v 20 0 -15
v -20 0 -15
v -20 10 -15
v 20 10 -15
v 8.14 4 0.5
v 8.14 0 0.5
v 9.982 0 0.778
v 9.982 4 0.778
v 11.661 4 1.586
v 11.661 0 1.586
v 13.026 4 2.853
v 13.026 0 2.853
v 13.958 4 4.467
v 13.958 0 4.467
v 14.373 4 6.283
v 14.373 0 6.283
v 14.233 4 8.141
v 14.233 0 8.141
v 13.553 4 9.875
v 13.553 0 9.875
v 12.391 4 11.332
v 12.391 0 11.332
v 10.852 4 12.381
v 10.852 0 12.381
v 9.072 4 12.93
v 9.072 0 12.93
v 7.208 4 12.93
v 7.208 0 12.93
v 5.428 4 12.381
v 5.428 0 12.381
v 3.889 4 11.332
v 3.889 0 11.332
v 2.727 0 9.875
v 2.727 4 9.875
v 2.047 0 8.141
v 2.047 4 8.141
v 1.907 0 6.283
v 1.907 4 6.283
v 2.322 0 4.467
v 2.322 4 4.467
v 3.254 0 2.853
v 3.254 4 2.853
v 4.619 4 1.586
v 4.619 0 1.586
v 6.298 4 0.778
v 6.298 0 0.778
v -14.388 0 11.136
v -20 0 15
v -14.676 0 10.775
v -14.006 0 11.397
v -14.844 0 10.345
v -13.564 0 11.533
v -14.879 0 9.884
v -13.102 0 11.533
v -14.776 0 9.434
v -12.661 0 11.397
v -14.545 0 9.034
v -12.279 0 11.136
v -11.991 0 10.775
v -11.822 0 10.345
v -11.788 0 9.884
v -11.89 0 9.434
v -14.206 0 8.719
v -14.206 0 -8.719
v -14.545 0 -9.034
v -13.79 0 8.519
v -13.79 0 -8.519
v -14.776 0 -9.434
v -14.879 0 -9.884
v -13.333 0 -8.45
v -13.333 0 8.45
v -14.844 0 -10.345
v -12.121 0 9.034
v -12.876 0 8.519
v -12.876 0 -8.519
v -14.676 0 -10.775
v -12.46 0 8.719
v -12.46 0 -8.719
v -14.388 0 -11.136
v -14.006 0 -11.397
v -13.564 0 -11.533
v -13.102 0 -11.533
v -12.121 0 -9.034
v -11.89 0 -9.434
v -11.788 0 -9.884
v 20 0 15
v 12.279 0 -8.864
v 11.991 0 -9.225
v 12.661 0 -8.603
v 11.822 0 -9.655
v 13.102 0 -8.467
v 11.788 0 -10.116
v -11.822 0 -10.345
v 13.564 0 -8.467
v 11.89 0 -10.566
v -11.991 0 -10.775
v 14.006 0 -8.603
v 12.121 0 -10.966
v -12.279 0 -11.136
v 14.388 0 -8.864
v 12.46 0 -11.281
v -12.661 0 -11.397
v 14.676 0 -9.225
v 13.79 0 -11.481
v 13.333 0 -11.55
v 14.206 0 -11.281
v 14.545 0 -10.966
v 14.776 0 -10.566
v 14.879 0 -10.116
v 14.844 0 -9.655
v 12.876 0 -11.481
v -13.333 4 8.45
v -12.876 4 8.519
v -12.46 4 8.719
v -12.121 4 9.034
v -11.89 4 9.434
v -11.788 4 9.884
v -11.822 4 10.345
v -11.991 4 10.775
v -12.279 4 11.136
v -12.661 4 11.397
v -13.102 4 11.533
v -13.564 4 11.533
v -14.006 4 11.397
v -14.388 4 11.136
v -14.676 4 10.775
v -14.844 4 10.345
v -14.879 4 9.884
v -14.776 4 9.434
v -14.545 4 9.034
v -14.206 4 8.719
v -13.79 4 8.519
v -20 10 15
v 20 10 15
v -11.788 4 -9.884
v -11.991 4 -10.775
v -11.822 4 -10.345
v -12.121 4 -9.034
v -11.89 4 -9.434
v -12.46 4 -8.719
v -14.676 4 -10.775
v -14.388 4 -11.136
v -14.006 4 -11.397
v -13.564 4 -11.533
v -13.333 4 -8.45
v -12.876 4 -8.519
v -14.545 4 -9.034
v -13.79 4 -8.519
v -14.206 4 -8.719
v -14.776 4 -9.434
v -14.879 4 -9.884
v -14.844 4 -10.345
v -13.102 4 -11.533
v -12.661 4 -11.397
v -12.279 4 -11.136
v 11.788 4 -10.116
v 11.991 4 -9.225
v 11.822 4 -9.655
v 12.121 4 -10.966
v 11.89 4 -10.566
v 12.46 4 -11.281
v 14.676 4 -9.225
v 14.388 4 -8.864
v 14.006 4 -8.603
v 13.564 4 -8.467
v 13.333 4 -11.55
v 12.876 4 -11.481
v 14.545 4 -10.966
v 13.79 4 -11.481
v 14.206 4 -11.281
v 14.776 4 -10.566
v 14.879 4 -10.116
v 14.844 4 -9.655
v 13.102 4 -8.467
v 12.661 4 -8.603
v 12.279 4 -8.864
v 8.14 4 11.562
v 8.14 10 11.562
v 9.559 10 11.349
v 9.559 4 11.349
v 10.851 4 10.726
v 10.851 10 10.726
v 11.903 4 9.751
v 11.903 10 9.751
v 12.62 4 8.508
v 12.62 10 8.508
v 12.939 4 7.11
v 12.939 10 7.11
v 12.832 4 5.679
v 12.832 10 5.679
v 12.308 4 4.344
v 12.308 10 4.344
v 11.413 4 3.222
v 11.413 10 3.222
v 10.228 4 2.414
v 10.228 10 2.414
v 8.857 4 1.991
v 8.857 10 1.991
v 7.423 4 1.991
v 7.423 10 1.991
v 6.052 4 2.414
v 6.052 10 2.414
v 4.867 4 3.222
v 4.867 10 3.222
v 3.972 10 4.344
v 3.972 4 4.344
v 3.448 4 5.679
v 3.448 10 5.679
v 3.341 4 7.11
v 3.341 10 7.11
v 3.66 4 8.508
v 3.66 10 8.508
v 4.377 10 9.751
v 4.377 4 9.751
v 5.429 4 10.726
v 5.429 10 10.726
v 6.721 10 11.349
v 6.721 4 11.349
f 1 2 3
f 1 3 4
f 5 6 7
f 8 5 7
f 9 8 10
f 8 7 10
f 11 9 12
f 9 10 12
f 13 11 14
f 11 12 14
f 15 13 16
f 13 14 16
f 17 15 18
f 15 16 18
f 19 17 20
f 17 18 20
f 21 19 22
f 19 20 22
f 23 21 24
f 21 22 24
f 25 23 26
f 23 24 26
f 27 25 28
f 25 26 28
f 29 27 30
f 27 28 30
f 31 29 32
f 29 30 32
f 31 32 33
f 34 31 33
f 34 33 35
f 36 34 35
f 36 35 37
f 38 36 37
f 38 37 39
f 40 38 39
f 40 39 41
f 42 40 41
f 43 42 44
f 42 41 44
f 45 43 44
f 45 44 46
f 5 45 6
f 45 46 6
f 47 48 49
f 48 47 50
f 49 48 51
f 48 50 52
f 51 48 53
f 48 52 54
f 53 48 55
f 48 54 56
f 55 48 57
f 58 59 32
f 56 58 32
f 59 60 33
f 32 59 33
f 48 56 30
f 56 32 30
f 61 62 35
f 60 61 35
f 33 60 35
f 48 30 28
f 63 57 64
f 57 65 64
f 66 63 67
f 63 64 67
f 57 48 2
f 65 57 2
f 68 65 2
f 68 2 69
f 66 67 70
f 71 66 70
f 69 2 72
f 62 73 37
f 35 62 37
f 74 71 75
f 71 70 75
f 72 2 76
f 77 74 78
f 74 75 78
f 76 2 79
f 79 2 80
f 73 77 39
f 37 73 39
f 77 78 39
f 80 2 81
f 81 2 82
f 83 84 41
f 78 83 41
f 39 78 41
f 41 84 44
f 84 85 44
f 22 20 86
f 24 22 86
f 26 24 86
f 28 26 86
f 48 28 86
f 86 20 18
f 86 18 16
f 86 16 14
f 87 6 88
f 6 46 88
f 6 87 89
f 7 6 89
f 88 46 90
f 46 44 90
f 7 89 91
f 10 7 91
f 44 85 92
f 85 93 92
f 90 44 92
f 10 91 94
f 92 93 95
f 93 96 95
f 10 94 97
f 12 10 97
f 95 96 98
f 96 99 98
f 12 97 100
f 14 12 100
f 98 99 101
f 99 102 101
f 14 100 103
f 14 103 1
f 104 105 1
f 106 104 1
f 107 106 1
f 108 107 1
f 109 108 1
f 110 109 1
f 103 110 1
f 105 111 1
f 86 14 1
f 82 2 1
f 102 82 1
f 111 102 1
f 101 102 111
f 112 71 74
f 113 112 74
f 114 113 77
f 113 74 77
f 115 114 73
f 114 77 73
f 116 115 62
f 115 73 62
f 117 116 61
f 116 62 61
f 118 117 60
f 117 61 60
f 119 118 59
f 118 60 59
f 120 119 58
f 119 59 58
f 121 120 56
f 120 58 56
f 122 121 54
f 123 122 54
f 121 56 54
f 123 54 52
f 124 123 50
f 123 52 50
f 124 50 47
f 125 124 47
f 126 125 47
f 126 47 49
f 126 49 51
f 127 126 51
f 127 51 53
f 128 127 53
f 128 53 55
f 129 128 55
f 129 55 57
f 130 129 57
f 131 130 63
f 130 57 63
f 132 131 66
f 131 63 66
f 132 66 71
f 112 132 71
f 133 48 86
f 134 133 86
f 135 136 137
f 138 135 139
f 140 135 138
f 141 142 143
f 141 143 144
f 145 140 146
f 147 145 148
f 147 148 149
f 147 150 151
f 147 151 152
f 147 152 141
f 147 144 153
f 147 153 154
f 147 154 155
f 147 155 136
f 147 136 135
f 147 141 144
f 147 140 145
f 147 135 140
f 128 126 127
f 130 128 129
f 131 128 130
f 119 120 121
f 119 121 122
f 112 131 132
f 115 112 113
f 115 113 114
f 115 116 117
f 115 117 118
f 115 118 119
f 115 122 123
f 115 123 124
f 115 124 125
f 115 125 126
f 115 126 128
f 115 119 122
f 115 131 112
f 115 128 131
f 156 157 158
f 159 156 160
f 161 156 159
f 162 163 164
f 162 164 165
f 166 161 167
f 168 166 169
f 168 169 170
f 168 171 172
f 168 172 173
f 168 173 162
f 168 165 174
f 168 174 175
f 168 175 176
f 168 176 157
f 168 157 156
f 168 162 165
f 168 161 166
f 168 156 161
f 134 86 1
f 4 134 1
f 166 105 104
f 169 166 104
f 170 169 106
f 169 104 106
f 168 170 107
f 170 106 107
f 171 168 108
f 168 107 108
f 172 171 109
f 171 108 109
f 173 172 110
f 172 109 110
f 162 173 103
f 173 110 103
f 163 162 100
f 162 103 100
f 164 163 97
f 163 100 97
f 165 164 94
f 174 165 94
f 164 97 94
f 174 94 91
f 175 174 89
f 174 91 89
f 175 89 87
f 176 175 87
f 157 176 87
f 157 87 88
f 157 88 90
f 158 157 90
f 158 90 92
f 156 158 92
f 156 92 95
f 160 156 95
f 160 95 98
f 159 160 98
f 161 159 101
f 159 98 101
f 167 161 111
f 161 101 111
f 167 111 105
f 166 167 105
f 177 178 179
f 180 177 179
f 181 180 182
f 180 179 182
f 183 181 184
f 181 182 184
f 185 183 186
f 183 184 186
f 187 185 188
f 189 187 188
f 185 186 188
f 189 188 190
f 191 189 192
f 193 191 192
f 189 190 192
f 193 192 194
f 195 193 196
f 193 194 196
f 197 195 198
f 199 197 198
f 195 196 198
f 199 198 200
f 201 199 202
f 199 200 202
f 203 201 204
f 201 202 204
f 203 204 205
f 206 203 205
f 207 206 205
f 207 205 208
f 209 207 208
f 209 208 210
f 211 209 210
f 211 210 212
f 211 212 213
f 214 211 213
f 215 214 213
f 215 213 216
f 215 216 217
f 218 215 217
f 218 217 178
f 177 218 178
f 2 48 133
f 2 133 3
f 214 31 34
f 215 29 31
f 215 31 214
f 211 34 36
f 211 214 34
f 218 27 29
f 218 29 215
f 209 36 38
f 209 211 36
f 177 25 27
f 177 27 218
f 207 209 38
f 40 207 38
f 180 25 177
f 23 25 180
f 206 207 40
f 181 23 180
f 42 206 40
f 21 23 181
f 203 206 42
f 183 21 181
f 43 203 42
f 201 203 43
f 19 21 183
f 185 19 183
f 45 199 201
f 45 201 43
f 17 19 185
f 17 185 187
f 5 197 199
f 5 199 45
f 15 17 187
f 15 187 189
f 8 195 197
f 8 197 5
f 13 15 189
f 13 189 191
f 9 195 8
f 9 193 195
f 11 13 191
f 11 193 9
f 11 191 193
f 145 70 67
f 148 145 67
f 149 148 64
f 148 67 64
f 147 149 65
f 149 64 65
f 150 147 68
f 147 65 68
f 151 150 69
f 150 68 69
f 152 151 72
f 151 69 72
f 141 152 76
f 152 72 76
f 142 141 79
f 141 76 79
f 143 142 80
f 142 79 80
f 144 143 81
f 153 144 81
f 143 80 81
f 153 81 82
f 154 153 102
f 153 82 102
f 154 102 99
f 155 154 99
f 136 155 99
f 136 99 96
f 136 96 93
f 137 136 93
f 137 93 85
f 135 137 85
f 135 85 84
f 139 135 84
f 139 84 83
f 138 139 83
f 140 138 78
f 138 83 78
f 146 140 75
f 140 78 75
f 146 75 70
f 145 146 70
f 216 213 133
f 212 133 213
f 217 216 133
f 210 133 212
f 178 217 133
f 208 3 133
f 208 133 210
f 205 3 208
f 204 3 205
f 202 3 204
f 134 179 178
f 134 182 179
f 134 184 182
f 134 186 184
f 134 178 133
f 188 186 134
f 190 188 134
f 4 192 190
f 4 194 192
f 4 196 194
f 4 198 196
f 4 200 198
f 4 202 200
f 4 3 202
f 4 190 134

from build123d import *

# Parameters (mm, degrees)
SKETCH1_W           = 40
SKETCH1_H           = 30
BOSS_EXTRUDE1_DEPTH = 10
SKETCH2_R           = 1.55
SKETCH2_R_2         = 6.25
CUT_EXTRUDE1_DEPTH  = 4
SKETCH3_R           = 4.8125
CUT_EXTRUDE2_DEPTH  = 10


with BuildPart() as part:
    # Sketch1 → Boss-Extrude1 (new body)
    with BuildSketch(Plane(origin=(0, 0, 0), x_dir=(1, 0, 0), z_dir=(0, 1, 0))):
        Rectangle(SKETCH1_W, SKETCH1_H)
    extrude(amount=BOSS_EXTRUDE1_DEPTH)

    # Sketch2 → Cut-Extrude1 (cut)
    with BuildSketch(Plane(origin=(0, 0, 0), x_dir=(-1, 0, 0), z_dir=(0, -1, 0))):
        with Locations(Location((13.333333333, -10, 0), (0, 0, 90))):
            Circle(SKETCH2_R)
        with Locations(Location((13.333333333, 10, 0), (0, 0, 270))):
            Circle(SKETCH2_R)
        with Locations(Location((-13.333333333, 10, 0), (0, 0, 90))):
            Circle(SKETCH2_R)
        with Locations(Location((-8.14, -6.75, 0), (0, 0, 90))):
            Circle(SKETCH2_R_2)
    extrude(amount=-CUT_EXTRUDE1_DEPTH, mode=Mode.SUBTRACT)

    # Sketch3 → Cut-Extrude2 (cut)
    with BuildSketch(Plane(origin=(0, 10, 0), x_dir=(1, 0, 0), z_dir=(0, 1, 0))):
        with Locations(Location((8.14, -6.75, 0), (0, 0, 270))):
            Circle(SKETCH3_R)
    extrude(amount=-CUT_EXTRUDE2_DEPTH, mode=Mode.SUBTRACT)


solid = part.part
